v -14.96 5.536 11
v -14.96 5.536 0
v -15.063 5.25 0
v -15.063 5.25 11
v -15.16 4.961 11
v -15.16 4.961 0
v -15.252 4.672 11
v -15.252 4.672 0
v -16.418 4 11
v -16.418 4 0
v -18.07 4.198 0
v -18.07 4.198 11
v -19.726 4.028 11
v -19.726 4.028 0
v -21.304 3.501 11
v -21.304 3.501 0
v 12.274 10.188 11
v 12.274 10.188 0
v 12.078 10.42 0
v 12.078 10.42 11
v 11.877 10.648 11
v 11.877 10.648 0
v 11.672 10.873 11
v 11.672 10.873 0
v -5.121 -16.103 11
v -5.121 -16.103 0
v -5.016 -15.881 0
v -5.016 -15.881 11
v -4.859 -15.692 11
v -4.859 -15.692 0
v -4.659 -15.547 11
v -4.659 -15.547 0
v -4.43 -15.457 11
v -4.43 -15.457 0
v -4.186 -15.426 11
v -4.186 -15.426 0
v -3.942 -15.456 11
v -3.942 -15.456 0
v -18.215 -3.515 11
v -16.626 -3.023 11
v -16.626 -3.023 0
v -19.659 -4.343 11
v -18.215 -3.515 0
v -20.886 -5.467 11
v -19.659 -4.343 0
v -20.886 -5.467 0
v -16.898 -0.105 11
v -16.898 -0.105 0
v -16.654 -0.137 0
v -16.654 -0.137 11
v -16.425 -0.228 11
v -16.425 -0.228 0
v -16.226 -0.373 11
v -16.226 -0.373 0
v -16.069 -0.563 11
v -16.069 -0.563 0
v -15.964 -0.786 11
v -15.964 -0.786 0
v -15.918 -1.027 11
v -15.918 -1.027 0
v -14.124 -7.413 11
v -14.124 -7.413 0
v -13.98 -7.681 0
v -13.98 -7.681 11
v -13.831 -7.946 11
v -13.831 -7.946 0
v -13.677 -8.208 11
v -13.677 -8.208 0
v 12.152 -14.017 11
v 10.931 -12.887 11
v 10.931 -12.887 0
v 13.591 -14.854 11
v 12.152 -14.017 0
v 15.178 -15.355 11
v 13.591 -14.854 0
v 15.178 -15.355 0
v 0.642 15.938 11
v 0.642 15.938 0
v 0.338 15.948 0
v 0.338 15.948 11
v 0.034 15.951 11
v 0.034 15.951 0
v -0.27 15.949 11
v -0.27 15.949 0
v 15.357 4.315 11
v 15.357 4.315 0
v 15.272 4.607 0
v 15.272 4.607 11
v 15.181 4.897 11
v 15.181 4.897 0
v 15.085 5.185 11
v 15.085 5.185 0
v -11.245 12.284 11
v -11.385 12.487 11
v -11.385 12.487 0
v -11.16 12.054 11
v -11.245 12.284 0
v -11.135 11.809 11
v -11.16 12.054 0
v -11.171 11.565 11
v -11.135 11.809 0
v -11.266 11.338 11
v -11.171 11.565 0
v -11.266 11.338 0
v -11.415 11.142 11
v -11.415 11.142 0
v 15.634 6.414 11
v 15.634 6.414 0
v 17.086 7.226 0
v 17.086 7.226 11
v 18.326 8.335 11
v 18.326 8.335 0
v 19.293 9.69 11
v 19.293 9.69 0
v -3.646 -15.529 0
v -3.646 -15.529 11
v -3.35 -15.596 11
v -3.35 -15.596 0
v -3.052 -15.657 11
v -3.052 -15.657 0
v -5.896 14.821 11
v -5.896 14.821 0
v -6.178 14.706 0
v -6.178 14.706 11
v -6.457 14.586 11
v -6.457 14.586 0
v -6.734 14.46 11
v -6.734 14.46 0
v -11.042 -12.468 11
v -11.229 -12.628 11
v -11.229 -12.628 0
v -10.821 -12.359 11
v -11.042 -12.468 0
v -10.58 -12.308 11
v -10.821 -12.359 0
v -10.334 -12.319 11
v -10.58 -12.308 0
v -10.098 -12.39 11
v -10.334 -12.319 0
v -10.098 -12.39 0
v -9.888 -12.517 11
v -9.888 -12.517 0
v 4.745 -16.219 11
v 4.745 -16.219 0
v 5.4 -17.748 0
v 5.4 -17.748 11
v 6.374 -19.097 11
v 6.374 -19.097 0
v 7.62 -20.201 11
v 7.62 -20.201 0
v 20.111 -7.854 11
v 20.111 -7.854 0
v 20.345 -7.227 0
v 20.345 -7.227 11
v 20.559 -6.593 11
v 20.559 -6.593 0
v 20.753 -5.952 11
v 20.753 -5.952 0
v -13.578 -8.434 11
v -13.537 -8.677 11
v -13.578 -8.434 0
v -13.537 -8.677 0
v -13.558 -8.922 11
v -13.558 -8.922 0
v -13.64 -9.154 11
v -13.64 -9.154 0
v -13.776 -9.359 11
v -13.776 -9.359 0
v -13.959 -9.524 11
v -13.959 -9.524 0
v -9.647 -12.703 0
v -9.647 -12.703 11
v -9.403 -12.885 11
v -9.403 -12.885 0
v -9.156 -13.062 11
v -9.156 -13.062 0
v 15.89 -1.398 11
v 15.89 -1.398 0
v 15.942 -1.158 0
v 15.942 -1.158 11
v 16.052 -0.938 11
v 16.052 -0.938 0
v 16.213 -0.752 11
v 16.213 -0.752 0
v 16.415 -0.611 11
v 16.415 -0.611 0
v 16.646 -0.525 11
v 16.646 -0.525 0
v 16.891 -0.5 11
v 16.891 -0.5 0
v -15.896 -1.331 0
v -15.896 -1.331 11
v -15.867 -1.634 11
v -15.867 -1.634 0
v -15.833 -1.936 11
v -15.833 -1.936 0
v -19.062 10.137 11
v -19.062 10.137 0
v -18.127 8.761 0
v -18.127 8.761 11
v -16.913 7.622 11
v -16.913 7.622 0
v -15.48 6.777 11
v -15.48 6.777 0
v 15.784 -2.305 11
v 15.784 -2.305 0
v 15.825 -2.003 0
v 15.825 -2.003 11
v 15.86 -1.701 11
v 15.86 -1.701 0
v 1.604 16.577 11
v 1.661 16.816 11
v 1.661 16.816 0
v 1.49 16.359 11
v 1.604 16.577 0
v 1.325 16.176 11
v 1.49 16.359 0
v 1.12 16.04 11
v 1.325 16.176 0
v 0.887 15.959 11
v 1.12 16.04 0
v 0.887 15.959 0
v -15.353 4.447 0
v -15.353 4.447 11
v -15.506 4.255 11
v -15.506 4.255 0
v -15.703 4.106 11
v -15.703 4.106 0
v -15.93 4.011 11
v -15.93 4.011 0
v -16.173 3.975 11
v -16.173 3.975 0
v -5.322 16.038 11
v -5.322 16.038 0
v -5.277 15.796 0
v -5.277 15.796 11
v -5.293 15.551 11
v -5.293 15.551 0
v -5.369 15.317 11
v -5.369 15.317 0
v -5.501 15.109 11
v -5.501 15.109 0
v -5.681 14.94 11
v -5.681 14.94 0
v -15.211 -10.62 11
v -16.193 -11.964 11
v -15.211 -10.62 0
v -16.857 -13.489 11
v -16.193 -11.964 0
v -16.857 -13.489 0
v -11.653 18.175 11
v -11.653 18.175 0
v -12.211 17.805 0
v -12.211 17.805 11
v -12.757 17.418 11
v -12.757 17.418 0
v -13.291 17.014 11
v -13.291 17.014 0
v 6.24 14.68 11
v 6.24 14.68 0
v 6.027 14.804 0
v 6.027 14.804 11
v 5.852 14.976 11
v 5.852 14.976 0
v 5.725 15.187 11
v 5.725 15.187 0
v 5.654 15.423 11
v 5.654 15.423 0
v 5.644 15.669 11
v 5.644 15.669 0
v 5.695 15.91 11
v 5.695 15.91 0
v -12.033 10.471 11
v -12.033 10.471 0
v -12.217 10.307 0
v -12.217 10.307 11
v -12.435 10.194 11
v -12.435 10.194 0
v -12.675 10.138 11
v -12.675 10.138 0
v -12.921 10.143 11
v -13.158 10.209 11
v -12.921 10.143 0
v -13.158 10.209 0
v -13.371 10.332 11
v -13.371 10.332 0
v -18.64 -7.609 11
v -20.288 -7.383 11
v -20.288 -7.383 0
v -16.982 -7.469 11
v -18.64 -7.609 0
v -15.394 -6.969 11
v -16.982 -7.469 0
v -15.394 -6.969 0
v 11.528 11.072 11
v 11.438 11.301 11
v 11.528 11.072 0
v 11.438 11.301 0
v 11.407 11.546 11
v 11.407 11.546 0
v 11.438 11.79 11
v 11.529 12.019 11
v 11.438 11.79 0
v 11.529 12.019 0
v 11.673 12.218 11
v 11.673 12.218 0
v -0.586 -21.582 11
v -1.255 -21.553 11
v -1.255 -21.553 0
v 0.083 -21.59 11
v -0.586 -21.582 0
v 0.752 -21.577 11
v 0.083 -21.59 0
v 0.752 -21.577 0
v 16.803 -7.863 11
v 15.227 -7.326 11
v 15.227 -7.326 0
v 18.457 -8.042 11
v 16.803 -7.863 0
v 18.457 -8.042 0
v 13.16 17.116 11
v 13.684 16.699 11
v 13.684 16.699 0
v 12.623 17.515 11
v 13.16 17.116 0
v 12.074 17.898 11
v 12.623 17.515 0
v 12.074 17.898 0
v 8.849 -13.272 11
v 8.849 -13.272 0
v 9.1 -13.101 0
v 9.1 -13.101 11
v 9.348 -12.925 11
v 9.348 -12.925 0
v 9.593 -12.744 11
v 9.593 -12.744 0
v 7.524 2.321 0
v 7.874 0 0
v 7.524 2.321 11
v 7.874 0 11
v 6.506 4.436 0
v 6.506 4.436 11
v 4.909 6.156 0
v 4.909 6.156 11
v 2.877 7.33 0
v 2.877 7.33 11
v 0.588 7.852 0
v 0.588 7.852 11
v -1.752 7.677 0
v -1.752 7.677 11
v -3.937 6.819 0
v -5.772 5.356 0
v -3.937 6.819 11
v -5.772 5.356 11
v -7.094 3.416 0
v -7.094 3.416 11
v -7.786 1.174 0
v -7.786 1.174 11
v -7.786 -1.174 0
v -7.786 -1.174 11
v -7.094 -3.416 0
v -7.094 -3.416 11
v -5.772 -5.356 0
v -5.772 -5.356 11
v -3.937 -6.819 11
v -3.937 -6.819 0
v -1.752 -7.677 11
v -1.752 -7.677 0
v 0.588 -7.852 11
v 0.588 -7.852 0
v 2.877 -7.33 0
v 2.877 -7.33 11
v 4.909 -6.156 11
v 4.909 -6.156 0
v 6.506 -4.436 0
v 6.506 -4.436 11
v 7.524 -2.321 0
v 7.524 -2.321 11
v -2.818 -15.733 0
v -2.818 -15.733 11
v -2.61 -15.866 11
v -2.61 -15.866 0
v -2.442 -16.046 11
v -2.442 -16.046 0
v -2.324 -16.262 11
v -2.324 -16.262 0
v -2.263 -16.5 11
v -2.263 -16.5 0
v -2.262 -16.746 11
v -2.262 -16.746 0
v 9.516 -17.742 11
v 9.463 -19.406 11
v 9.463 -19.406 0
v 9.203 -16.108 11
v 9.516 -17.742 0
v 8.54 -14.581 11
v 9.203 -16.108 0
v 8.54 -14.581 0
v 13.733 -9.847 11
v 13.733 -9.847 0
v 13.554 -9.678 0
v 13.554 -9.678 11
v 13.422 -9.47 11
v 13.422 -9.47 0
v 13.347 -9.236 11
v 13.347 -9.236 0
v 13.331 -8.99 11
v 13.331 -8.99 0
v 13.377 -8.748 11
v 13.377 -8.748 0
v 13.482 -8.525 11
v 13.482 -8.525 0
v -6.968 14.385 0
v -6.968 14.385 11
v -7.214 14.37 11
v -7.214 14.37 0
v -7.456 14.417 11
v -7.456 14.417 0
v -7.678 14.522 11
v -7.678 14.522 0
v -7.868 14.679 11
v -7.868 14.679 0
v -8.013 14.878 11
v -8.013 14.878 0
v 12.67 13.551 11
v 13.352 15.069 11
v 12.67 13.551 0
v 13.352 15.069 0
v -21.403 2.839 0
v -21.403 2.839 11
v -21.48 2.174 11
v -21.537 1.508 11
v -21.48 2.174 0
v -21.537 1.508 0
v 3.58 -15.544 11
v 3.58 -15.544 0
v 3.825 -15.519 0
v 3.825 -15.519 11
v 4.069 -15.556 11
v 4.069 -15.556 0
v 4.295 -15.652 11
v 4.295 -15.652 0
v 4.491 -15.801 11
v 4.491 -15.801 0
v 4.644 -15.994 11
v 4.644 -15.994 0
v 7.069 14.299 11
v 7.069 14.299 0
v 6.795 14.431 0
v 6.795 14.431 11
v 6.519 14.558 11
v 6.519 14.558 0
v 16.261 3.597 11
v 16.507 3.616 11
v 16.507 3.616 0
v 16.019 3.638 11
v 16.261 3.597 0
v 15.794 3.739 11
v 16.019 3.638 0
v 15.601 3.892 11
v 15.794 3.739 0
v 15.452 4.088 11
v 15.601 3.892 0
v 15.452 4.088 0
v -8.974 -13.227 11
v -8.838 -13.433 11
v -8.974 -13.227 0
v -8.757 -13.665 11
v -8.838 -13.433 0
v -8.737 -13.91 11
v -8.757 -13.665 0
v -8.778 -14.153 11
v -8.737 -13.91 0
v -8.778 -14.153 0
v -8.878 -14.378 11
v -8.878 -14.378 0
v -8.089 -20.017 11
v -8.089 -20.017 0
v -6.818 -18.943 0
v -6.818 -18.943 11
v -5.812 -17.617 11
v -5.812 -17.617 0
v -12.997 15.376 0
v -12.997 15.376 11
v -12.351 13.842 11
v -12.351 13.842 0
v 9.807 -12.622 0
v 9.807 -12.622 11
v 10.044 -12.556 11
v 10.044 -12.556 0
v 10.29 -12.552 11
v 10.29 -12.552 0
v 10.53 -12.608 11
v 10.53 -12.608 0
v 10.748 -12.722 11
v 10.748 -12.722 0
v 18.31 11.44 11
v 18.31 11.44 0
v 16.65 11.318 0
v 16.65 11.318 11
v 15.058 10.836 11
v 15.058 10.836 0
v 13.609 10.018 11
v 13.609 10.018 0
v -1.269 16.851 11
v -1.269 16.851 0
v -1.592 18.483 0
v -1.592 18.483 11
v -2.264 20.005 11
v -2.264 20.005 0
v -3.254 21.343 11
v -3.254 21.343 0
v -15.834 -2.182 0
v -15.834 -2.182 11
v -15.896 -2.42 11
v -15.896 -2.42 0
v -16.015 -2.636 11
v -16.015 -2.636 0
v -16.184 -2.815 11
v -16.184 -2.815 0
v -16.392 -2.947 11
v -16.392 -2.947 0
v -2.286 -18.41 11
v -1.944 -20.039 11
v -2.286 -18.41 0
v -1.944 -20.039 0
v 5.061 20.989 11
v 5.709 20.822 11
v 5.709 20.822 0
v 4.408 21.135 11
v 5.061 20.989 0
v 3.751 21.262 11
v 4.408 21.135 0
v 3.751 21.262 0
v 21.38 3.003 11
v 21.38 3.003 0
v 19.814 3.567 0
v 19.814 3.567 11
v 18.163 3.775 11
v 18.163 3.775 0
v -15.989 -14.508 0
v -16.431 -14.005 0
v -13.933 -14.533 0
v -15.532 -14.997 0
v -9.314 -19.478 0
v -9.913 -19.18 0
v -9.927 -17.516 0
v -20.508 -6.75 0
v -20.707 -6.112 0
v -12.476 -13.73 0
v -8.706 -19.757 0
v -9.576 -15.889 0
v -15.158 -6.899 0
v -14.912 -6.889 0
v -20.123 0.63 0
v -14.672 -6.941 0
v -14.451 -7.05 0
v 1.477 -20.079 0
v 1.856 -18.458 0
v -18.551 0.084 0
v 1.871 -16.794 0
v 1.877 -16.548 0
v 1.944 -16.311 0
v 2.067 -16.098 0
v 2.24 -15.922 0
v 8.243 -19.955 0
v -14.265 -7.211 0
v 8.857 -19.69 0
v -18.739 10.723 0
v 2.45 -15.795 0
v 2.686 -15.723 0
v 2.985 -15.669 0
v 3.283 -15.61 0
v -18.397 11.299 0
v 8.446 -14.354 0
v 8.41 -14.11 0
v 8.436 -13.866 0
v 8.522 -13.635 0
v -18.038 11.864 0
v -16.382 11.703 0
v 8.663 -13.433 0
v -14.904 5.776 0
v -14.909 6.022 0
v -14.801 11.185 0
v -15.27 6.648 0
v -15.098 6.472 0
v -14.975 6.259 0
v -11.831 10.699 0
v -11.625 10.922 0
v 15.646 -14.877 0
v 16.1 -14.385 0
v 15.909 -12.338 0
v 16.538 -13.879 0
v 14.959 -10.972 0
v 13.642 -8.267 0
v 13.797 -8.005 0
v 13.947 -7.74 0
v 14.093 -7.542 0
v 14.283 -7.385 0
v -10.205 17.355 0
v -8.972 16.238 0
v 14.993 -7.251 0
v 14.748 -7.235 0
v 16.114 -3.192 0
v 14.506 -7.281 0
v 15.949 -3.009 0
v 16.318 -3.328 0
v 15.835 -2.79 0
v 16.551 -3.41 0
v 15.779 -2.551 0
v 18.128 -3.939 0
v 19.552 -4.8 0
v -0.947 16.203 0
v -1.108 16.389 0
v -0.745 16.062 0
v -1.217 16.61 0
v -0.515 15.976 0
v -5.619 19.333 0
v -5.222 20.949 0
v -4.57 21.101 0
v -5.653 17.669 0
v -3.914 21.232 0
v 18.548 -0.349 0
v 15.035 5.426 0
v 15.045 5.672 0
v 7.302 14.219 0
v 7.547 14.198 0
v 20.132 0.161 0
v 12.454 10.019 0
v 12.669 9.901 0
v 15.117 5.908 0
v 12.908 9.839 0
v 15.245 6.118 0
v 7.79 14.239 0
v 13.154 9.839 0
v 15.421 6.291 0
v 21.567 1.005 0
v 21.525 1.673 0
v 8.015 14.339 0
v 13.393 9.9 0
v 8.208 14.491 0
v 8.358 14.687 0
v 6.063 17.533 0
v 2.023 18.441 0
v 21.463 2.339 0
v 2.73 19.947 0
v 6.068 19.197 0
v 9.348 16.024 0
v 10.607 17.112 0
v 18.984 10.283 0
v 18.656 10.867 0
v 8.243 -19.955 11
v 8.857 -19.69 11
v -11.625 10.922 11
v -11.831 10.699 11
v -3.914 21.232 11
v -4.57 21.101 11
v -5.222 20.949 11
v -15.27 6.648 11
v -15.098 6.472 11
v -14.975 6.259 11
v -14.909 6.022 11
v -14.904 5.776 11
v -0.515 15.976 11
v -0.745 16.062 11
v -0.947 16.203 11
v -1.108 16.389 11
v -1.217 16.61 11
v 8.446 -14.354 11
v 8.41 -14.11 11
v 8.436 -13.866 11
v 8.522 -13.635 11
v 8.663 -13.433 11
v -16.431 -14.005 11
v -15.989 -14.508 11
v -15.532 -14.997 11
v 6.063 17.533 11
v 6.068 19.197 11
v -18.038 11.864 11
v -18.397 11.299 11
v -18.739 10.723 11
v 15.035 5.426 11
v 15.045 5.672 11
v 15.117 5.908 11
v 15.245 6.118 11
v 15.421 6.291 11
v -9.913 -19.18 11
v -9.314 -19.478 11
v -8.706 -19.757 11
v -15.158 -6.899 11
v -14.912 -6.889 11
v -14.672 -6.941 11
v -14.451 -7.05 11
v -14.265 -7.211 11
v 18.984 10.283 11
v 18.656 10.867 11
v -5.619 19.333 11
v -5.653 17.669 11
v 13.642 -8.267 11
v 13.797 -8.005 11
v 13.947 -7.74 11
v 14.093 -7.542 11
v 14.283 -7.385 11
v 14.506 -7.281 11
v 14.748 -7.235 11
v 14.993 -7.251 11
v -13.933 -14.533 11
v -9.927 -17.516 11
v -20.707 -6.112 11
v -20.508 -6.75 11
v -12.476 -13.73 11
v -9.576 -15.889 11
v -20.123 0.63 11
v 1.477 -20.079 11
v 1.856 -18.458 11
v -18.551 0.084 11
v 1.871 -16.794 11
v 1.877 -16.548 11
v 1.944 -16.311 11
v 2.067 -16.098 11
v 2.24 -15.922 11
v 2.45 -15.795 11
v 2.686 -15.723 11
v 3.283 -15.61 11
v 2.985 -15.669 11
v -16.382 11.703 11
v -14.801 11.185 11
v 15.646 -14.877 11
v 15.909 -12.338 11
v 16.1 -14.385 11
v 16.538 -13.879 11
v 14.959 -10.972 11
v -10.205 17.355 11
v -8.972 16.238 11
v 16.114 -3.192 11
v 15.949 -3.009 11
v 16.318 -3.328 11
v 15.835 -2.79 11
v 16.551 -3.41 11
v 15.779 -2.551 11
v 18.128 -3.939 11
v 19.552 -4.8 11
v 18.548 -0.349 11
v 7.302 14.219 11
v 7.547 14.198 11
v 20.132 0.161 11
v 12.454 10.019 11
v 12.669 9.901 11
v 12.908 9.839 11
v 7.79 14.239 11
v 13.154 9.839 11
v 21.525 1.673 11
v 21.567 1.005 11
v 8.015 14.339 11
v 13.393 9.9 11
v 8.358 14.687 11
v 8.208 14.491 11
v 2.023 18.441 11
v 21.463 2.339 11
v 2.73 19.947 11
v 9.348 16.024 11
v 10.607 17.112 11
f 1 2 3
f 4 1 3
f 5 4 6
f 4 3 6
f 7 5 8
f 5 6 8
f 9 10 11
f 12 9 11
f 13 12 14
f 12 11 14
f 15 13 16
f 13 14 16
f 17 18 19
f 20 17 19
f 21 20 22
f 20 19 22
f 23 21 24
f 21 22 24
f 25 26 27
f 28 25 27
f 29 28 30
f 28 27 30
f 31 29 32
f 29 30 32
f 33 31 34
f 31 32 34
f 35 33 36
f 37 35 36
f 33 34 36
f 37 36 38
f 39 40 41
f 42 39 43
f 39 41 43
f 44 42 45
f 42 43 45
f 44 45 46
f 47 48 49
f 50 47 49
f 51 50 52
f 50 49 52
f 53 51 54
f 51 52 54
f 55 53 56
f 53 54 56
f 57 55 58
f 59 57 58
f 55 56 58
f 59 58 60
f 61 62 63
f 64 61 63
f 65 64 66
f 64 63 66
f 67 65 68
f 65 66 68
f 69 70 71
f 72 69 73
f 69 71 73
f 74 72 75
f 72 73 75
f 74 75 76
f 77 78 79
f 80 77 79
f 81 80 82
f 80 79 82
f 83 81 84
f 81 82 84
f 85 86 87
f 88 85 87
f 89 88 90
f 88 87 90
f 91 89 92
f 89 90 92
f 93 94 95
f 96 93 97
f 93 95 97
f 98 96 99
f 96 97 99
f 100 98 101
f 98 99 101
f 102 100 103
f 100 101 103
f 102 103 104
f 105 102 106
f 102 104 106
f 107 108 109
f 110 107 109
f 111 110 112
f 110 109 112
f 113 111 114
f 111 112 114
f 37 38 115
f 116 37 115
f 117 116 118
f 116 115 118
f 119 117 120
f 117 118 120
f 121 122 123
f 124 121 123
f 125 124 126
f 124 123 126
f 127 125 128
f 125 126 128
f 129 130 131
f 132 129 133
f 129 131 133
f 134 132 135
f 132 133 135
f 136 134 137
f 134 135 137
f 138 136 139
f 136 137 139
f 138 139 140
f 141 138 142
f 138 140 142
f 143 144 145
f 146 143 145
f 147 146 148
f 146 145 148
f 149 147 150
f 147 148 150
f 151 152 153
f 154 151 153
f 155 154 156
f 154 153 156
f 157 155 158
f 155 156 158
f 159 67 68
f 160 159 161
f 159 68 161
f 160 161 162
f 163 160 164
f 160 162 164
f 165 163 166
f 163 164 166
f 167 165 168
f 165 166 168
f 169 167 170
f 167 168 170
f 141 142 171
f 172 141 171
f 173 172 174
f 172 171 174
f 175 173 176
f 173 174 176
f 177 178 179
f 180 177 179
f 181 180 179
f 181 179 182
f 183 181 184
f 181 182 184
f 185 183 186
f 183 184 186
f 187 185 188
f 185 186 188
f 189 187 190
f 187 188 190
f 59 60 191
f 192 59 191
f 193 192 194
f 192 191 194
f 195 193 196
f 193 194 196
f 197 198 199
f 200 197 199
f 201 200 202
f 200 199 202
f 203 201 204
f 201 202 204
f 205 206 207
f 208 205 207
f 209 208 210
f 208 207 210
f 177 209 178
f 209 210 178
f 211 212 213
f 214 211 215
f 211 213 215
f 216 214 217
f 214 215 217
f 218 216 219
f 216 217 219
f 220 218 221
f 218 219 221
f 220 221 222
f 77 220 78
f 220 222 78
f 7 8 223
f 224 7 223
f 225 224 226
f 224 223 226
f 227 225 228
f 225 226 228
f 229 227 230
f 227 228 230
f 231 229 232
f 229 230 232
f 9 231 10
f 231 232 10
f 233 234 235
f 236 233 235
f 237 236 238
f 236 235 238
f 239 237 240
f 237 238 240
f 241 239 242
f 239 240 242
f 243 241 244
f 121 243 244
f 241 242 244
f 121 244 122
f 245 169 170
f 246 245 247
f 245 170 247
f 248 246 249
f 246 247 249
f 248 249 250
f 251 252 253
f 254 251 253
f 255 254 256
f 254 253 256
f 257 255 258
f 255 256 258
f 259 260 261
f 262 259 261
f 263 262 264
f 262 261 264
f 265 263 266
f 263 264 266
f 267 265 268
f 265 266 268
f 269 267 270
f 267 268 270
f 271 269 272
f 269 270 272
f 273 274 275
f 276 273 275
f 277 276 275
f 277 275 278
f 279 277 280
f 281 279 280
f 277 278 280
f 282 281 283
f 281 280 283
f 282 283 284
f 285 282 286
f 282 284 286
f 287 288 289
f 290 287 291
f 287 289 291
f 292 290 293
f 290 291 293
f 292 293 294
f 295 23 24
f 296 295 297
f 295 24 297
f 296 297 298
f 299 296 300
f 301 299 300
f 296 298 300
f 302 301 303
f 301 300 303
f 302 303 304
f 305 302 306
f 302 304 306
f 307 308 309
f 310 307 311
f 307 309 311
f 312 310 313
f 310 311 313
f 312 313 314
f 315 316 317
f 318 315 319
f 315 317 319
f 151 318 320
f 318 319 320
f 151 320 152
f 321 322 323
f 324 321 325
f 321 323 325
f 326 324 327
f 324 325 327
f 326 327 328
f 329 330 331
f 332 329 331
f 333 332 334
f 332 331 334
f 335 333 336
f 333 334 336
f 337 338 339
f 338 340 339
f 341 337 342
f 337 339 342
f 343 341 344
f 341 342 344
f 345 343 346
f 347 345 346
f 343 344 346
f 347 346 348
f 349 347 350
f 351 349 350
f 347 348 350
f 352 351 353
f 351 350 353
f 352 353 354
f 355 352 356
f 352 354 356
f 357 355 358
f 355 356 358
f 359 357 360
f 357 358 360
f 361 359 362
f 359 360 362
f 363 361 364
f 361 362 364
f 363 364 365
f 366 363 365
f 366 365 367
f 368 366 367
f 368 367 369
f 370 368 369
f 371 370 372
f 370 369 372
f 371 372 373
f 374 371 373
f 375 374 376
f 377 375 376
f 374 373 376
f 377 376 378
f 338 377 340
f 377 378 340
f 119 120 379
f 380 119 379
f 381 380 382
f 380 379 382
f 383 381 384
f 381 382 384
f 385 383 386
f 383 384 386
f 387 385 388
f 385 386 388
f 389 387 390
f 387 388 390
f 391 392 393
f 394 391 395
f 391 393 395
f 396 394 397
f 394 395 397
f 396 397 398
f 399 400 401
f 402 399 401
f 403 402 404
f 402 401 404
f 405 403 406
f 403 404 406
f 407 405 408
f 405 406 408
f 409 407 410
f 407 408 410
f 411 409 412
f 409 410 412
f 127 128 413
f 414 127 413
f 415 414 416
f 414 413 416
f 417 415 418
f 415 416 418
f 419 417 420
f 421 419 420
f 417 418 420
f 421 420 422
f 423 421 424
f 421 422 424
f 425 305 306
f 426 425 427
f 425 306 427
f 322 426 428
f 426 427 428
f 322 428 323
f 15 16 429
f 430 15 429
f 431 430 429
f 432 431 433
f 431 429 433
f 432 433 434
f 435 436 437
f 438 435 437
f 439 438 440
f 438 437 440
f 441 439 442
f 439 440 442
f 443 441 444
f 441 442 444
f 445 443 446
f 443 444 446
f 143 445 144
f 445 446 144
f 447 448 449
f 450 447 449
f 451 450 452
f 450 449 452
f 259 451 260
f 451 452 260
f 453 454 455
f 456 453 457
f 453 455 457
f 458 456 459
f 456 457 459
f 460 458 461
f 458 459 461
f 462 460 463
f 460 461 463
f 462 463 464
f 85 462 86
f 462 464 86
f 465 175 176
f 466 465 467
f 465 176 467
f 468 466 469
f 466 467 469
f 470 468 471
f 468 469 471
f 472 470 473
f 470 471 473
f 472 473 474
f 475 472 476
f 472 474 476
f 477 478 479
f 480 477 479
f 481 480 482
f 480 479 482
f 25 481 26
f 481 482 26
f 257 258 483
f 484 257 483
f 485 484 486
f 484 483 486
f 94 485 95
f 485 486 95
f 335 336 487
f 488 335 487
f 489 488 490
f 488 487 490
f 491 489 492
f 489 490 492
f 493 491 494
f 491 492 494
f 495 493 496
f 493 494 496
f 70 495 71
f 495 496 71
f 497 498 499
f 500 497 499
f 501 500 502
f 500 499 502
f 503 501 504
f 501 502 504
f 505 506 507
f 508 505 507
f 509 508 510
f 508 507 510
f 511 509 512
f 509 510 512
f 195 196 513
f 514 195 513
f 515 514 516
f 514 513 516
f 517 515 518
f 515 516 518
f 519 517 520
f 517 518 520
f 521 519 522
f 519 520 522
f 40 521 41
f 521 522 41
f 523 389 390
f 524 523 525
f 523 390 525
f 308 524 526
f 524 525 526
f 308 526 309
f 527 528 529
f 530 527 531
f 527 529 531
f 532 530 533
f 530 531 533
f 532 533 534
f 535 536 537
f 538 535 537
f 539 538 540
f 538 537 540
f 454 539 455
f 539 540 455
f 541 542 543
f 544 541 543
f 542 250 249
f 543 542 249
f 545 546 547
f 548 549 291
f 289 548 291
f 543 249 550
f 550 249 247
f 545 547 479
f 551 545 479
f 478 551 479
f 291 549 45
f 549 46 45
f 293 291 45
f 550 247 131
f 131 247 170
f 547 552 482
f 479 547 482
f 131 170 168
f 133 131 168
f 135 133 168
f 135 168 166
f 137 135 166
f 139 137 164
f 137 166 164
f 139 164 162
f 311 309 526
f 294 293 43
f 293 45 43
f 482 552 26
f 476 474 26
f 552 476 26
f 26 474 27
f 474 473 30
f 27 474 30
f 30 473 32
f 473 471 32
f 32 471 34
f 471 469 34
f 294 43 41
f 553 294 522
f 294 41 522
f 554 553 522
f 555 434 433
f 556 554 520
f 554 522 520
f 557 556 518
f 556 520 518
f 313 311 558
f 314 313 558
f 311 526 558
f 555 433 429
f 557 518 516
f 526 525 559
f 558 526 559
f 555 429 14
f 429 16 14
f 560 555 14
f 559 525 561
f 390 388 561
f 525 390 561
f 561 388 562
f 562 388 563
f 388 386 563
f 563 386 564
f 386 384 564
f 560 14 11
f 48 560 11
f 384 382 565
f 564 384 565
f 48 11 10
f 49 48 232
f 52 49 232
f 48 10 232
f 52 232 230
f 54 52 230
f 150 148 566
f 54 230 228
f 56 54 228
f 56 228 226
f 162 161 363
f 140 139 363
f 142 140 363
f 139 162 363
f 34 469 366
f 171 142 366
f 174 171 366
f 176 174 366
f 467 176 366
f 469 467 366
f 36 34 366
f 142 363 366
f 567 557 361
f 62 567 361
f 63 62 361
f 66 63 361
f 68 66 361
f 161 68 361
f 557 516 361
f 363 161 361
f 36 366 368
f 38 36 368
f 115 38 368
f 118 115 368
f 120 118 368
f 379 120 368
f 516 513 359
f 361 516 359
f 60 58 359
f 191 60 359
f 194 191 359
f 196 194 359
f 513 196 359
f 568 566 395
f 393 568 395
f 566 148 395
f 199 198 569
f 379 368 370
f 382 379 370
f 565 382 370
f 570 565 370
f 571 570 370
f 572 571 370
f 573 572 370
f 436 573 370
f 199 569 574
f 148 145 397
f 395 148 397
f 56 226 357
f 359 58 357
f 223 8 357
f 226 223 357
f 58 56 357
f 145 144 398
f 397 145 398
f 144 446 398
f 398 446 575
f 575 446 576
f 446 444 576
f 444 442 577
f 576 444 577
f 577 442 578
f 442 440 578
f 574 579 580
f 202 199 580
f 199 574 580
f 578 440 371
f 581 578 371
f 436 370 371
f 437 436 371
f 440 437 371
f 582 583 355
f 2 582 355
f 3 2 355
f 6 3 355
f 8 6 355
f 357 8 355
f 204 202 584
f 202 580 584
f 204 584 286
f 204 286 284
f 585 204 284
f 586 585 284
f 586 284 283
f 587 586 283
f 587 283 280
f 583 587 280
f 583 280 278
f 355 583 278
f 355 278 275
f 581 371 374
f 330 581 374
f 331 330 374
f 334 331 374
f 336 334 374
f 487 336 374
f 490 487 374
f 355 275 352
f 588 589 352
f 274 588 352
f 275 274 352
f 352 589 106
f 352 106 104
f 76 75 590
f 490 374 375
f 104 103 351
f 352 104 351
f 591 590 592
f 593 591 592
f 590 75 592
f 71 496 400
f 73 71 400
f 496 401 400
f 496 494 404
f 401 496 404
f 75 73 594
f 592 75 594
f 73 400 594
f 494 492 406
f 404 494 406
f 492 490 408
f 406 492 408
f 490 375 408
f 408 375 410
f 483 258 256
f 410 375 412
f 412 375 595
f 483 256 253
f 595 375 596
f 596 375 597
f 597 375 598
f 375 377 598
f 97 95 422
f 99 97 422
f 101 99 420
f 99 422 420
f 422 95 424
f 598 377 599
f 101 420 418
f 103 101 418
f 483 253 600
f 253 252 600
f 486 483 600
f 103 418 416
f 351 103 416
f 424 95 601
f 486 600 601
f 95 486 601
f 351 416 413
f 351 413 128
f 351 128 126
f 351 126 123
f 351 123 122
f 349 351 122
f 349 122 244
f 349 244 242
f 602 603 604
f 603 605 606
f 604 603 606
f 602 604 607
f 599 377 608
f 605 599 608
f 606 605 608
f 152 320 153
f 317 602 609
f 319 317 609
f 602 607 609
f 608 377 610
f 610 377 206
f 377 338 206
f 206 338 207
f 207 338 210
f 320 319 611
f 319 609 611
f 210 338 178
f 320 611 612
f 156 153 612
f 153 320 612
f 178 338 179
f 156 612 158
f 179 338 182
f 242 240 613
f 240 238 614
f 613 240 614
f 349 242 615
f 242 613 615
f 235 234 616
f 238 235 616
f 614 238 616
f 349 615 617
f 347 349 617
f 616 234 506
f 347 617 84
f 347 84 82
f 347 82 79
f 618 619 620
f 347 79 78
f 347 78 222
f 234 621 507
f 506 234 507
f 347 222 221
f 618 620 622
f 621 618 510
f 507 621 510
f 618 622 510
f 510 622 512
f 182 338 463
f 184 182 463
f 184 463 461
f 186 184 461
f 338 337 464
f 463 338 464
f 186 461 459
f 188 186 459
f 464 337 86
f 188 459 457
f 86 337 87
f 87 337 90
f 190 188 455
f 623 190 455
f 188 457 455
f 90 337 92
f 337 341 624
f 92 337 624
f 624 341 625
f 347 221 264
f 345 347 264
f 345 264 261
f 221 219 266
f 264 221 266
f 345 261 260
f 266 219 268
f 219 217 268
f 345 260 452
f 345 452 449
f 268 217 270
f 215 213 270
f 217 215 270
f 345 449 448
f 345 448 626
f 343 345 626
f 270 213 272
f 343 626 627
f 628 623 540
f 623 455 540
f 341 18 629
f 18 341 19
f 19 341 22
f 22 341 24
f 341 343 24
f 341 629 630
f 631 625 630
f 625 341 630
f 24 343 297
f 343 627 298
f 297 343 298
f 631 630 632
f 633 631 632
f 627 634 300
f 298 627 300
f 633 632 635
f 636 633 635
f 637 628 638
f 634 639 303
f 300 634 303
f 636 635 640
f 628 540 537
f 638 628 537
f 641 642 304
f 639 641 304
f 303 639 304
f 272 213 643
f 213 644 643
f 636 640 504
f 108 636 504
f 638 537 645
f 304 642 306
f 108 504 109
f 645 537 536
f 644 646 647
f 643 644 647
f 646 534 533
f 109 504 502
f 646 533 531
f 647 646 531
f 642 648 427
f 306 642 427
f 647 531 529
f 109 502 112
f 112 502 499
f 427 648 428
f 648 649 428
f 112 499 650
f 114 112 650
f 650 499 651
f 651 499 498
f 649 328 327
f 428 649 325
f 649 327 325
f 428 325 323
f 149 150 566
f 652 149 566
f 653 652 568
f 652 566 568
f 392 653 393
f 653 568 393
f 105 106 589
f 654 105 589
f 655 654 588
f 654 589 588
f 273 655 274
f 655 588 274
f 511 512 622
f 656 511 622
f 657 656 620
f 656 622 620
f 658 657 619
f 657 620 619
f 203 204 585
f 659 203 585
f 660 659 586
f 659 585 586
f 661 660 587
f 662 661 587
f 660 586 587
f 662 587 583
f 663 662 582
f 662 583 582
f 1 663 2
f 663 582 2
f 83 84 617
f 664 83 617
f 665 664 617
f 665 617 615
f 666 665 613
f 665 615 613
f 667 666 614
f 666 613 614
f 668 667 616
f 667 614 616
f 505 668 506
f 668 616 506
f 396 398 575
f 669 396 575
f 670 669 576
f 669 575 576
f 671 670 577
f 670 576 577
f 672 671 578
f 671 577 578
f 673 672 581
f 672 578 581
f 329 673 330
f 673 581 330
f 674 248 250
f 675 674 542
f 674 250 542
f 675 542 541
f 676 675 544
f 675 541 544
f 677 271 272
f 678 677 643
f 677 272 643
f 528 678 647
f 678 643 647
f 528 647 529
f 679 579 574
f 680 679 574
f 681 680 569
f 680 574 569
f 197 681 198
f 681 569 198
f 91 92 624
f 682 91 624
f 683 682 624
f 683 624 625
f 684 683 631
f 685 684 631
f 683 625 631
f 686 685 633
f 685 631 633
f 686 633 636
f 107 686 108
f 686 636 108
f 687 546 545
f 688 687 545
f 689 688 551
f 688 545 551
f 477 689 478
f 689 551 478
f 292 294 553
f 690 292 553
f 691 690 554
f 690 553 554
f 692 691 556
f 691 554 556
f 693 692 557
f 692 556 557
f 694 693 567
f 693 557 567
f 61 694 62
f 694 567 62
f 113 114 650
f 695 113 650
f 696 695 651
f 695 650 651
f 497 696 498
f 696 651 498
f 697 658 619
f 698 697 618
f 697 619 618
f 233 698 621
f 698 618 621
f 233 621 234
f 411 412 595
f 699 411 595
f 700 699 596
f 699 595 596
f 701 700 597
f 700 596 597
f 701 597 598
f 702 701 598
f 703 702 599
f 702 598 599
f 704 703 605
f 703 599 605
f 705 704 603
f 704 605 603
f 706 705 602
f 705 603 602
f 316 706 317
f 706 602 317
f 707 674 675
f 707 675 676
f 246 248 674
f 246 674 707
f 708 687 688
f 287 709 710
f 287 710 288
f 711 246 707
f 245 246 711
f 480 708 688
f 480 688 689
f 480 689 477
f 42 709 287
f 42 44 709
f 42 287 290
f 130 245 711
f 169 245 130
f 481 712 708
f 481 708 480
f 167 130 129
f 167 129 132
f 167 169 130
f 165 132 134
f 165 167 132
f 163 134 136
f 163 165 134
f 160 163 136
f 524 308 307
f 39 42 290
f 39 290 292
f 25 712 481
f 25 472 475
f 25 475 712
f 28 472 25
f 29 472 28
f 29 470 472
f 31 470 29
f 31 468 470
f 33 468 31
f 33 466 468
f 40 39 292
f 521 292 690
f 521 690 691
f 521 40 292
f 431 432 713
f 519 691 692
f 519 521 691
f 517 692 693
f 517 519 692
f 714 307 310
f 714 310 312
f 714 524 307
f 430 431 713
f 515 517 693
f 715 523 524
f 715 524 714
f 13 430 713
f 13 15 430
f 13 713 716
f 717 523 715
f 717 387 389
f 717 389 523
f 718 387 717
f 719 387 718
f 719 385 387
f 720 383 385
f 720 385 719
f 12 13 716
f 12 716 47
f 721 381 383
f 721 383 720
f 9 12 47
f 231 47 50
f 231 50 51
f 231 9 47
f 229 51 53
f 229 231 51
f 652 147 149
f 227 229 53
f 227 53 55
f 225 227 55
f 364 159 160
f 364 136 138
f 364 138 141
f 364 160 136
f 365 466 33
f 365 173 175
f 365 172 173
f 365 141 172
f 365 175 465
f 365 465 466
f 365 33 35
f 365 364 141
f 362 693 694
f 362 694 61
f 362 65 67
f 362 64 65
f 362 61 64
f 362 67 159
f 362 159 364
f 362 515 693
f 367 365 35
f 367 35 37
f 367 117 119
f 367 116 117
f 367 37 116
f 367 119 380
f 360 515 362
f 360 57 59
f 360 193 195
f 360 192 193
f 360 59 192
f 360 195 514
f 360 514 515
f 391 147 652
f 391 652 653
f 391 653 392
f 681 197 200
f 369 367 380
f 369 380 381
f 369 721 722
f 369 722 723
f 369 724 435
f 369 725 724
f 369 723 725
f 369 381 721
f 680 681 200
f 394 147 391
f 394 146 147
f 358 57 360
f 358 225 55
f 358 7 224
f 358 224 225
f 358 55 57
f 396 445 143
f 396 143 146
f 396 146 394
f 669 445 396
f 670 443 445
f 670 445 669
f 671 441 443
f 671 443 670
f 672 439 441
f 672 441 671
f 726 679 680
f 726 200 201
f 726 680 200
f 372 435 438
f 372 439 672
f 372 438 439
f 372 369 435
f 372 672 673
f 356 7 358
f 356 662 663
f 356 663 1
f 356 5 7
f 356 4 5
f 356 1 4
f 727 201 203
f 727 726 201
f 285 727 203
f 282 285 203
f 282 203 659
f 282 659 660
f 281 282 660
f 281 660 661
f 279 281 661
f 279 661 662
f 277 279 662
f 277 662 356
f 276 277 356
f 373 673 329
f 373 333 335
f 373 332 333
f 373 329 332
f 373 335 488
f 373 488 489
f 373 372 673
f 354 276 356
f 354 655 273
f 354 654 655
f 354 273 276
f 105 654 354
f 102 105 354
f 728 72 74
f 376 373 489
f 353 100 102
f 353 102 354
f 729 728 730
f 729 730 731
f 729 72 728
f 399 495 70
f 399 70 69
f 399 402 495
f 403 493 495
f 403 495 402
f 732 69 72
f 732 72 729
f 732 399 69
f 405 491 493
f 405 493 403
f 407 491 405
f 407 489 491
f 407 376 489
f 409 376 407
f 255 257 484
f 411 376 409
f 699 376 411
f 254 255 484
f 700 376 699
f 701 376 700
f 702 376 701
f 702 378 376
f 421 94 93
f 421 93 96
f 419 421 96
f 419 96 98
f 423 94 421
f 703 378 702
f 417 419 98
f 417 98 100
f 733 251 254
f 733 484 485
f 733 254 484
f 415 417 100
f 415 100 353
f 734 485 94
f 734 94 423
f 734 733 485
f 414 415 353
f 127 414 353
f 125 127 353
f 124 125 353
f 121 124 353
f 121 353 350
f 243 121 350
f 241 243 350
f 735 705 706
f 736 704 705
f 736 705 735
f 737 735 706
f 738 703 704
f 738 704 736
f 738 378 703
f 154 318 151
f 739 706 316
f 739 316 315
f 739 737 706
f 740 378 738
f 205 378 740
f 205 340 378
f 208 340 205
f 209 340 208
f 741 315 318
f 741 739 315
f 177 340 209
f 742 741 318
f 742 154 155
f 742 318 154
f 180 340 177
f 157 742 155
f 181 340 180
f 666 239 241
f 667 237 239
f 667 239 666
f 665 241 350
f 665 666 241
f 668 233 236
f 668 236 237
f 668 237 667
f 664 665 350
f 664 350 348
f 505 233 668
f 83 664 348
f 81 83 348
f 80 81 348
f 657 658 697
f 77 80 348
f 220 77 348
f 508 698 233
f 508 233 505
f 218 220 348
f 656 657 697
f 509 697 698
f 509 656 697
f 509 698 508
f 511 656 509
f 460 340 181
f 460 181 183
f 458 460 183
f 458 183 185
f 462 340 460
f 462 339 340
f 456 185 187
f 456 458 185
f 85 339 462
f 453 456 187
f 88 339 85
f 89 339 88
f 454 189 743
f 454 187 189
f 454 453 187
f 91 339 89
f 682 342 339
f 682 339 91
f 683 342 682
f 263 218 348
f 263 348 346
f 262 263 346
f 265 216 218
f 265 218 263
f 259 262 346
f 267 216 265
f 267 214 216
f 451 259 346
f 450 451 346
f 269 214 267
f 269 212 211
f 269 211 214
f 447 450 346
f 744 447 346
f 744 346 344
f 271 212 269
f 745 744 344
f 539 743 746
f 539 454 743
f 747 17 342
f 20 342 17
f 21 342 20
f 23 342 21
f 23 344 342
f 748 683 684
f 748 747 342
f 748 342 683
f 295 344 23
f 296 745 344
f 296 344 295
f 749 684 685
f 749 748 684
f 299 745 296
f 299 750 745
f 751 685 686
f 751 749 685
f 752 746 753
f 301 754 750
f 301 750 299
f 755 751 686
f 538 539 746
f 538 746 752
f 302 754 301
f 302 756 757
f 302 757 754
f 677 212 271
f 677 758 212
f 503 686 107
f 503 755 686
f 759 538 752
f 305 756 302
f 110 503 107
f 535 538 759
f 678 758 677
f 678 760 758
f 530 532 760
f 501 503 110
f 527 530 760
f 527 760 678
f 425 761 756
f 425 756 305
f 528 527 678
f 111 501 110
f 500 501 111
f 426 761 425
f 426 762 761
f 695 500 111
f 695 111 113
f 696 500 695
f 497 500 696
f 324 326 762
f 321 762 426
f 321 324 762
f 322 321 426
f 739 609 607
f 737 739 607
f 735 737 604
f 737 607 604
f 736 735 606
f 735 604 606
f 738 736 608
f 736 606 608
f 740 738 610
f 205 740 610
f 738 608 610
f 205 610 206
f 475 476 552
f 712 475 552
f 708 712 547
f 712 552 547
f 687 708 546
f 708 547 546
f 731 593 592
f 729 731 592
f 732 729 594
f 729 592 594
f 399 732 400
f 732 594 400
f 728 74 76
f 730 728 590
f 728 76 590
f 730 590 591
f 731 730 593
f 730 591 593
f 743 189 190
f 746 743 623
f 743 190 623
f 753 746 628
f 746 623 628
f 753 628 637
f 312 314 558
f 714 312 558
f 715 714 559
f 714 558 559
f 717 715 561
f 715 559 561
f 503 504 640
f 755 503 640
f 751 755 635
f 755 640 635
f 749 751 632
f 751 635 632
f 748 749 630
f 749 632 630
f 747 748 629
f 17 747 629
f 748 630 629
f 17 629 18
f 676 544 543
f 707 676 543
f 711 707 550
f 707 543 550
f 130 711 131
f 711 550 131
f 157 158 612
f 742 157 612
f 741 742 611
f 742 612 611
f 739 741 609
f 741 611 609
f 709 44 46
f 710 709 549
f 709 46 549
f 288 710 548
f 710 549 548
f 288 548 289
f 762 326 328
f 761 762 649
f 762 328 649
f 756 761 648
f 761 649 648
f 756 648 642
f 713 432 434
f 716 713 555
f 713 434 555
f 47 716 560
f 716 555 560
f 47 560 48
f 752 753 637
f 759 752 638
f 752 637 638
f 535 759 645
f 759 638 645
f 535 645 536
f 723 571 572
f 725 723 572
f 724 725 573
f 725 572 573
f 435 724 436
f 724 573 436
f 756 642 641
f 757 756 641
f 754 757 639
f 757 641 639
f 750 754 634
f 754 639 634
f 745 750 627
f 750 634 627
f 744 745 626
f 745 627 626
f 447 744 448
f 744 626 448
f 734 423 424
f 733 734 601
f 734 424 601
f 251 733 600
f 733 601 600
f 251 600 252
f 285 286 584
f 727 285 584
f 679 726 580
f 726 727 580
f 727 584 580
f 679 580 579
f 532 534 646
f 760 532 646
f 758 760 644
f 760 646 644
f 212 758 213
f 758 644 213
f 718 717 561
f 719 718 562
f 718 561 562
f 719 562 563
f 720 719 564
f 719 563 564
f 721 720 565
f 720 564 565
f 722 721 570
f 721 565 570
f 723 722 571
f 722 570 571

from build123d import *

# Parameters (mm, degrees)
SKETCH3_R         = 21.59
GEARBODY_DEPTH    = 11
TOOTHCUT_DEPTH    = 12
CIRPATTERN1_COUNT = 15
BOREDIA_R         = 7.874
BORE_DEPTH        = 12700


with BuildPart() as part:
    # Sketch3 → gearBody (new body)
    with BuildSketch(Plane.XY):
        Circle(SKETCH3_R)
    extrude(amount=GEARBODY_DEPTH)

    # Sketch2 → toothCut (cut, through all)
    with BuildSketch(Plane.XY):
        with BuildLine():
            ThreePointArc((15.783846764, -2.304552616), (15.843293638, -1.852249483), (15.889781974, -1.39843136))
            ThreePointArc((15.889781974, -1.39843136), (16.213055843, -0.751556907), (16.890861518, -0.499501321))
            ThreePointArc((16.890861518, -0.499501321), (20.504912911, 0.340315353), (23.283949955, 2.798691365))
            ThreePointArc((23.283949955, 2.798691365), (23.292901215, -2.723187818), (22.010467945, -8.09409042))
            ThreePointArc((22.010467945, -8.09409042), (19.873444675, -5.060974685), (16.550574786, -3.410158156))
            ThreePointArc((16.550574786, -3.410158156), (15.949189176, -3.008551507), (15.783846764, -2.304552616))
        make_face()
    toothcut = extrude(amount=TOOTHCUT_DEPTH, mode=Mode.SUBTRACT)

    # CirPattern1: toothCut ×15 about axis
    cirpattern1_axis = Axis((0, 0, 0), (0, 0, 1))
    for i in range(1, CIRPATTERN1_COUNT):
        add(toothcut.rotate(cirpattern1_axis, i * 360 / CIRPATTERN1_COUNT), mode=Mode.SUBTRACT)

    # boreDia → bore (cut, symmetric)
    with BuildSketch(Plane.XY):
        Circle(BOREDIA_R)
    extrude(amount=BORE_DEPTH, both=True, mode=Mode.SUBTRACT)


solid = part.part
